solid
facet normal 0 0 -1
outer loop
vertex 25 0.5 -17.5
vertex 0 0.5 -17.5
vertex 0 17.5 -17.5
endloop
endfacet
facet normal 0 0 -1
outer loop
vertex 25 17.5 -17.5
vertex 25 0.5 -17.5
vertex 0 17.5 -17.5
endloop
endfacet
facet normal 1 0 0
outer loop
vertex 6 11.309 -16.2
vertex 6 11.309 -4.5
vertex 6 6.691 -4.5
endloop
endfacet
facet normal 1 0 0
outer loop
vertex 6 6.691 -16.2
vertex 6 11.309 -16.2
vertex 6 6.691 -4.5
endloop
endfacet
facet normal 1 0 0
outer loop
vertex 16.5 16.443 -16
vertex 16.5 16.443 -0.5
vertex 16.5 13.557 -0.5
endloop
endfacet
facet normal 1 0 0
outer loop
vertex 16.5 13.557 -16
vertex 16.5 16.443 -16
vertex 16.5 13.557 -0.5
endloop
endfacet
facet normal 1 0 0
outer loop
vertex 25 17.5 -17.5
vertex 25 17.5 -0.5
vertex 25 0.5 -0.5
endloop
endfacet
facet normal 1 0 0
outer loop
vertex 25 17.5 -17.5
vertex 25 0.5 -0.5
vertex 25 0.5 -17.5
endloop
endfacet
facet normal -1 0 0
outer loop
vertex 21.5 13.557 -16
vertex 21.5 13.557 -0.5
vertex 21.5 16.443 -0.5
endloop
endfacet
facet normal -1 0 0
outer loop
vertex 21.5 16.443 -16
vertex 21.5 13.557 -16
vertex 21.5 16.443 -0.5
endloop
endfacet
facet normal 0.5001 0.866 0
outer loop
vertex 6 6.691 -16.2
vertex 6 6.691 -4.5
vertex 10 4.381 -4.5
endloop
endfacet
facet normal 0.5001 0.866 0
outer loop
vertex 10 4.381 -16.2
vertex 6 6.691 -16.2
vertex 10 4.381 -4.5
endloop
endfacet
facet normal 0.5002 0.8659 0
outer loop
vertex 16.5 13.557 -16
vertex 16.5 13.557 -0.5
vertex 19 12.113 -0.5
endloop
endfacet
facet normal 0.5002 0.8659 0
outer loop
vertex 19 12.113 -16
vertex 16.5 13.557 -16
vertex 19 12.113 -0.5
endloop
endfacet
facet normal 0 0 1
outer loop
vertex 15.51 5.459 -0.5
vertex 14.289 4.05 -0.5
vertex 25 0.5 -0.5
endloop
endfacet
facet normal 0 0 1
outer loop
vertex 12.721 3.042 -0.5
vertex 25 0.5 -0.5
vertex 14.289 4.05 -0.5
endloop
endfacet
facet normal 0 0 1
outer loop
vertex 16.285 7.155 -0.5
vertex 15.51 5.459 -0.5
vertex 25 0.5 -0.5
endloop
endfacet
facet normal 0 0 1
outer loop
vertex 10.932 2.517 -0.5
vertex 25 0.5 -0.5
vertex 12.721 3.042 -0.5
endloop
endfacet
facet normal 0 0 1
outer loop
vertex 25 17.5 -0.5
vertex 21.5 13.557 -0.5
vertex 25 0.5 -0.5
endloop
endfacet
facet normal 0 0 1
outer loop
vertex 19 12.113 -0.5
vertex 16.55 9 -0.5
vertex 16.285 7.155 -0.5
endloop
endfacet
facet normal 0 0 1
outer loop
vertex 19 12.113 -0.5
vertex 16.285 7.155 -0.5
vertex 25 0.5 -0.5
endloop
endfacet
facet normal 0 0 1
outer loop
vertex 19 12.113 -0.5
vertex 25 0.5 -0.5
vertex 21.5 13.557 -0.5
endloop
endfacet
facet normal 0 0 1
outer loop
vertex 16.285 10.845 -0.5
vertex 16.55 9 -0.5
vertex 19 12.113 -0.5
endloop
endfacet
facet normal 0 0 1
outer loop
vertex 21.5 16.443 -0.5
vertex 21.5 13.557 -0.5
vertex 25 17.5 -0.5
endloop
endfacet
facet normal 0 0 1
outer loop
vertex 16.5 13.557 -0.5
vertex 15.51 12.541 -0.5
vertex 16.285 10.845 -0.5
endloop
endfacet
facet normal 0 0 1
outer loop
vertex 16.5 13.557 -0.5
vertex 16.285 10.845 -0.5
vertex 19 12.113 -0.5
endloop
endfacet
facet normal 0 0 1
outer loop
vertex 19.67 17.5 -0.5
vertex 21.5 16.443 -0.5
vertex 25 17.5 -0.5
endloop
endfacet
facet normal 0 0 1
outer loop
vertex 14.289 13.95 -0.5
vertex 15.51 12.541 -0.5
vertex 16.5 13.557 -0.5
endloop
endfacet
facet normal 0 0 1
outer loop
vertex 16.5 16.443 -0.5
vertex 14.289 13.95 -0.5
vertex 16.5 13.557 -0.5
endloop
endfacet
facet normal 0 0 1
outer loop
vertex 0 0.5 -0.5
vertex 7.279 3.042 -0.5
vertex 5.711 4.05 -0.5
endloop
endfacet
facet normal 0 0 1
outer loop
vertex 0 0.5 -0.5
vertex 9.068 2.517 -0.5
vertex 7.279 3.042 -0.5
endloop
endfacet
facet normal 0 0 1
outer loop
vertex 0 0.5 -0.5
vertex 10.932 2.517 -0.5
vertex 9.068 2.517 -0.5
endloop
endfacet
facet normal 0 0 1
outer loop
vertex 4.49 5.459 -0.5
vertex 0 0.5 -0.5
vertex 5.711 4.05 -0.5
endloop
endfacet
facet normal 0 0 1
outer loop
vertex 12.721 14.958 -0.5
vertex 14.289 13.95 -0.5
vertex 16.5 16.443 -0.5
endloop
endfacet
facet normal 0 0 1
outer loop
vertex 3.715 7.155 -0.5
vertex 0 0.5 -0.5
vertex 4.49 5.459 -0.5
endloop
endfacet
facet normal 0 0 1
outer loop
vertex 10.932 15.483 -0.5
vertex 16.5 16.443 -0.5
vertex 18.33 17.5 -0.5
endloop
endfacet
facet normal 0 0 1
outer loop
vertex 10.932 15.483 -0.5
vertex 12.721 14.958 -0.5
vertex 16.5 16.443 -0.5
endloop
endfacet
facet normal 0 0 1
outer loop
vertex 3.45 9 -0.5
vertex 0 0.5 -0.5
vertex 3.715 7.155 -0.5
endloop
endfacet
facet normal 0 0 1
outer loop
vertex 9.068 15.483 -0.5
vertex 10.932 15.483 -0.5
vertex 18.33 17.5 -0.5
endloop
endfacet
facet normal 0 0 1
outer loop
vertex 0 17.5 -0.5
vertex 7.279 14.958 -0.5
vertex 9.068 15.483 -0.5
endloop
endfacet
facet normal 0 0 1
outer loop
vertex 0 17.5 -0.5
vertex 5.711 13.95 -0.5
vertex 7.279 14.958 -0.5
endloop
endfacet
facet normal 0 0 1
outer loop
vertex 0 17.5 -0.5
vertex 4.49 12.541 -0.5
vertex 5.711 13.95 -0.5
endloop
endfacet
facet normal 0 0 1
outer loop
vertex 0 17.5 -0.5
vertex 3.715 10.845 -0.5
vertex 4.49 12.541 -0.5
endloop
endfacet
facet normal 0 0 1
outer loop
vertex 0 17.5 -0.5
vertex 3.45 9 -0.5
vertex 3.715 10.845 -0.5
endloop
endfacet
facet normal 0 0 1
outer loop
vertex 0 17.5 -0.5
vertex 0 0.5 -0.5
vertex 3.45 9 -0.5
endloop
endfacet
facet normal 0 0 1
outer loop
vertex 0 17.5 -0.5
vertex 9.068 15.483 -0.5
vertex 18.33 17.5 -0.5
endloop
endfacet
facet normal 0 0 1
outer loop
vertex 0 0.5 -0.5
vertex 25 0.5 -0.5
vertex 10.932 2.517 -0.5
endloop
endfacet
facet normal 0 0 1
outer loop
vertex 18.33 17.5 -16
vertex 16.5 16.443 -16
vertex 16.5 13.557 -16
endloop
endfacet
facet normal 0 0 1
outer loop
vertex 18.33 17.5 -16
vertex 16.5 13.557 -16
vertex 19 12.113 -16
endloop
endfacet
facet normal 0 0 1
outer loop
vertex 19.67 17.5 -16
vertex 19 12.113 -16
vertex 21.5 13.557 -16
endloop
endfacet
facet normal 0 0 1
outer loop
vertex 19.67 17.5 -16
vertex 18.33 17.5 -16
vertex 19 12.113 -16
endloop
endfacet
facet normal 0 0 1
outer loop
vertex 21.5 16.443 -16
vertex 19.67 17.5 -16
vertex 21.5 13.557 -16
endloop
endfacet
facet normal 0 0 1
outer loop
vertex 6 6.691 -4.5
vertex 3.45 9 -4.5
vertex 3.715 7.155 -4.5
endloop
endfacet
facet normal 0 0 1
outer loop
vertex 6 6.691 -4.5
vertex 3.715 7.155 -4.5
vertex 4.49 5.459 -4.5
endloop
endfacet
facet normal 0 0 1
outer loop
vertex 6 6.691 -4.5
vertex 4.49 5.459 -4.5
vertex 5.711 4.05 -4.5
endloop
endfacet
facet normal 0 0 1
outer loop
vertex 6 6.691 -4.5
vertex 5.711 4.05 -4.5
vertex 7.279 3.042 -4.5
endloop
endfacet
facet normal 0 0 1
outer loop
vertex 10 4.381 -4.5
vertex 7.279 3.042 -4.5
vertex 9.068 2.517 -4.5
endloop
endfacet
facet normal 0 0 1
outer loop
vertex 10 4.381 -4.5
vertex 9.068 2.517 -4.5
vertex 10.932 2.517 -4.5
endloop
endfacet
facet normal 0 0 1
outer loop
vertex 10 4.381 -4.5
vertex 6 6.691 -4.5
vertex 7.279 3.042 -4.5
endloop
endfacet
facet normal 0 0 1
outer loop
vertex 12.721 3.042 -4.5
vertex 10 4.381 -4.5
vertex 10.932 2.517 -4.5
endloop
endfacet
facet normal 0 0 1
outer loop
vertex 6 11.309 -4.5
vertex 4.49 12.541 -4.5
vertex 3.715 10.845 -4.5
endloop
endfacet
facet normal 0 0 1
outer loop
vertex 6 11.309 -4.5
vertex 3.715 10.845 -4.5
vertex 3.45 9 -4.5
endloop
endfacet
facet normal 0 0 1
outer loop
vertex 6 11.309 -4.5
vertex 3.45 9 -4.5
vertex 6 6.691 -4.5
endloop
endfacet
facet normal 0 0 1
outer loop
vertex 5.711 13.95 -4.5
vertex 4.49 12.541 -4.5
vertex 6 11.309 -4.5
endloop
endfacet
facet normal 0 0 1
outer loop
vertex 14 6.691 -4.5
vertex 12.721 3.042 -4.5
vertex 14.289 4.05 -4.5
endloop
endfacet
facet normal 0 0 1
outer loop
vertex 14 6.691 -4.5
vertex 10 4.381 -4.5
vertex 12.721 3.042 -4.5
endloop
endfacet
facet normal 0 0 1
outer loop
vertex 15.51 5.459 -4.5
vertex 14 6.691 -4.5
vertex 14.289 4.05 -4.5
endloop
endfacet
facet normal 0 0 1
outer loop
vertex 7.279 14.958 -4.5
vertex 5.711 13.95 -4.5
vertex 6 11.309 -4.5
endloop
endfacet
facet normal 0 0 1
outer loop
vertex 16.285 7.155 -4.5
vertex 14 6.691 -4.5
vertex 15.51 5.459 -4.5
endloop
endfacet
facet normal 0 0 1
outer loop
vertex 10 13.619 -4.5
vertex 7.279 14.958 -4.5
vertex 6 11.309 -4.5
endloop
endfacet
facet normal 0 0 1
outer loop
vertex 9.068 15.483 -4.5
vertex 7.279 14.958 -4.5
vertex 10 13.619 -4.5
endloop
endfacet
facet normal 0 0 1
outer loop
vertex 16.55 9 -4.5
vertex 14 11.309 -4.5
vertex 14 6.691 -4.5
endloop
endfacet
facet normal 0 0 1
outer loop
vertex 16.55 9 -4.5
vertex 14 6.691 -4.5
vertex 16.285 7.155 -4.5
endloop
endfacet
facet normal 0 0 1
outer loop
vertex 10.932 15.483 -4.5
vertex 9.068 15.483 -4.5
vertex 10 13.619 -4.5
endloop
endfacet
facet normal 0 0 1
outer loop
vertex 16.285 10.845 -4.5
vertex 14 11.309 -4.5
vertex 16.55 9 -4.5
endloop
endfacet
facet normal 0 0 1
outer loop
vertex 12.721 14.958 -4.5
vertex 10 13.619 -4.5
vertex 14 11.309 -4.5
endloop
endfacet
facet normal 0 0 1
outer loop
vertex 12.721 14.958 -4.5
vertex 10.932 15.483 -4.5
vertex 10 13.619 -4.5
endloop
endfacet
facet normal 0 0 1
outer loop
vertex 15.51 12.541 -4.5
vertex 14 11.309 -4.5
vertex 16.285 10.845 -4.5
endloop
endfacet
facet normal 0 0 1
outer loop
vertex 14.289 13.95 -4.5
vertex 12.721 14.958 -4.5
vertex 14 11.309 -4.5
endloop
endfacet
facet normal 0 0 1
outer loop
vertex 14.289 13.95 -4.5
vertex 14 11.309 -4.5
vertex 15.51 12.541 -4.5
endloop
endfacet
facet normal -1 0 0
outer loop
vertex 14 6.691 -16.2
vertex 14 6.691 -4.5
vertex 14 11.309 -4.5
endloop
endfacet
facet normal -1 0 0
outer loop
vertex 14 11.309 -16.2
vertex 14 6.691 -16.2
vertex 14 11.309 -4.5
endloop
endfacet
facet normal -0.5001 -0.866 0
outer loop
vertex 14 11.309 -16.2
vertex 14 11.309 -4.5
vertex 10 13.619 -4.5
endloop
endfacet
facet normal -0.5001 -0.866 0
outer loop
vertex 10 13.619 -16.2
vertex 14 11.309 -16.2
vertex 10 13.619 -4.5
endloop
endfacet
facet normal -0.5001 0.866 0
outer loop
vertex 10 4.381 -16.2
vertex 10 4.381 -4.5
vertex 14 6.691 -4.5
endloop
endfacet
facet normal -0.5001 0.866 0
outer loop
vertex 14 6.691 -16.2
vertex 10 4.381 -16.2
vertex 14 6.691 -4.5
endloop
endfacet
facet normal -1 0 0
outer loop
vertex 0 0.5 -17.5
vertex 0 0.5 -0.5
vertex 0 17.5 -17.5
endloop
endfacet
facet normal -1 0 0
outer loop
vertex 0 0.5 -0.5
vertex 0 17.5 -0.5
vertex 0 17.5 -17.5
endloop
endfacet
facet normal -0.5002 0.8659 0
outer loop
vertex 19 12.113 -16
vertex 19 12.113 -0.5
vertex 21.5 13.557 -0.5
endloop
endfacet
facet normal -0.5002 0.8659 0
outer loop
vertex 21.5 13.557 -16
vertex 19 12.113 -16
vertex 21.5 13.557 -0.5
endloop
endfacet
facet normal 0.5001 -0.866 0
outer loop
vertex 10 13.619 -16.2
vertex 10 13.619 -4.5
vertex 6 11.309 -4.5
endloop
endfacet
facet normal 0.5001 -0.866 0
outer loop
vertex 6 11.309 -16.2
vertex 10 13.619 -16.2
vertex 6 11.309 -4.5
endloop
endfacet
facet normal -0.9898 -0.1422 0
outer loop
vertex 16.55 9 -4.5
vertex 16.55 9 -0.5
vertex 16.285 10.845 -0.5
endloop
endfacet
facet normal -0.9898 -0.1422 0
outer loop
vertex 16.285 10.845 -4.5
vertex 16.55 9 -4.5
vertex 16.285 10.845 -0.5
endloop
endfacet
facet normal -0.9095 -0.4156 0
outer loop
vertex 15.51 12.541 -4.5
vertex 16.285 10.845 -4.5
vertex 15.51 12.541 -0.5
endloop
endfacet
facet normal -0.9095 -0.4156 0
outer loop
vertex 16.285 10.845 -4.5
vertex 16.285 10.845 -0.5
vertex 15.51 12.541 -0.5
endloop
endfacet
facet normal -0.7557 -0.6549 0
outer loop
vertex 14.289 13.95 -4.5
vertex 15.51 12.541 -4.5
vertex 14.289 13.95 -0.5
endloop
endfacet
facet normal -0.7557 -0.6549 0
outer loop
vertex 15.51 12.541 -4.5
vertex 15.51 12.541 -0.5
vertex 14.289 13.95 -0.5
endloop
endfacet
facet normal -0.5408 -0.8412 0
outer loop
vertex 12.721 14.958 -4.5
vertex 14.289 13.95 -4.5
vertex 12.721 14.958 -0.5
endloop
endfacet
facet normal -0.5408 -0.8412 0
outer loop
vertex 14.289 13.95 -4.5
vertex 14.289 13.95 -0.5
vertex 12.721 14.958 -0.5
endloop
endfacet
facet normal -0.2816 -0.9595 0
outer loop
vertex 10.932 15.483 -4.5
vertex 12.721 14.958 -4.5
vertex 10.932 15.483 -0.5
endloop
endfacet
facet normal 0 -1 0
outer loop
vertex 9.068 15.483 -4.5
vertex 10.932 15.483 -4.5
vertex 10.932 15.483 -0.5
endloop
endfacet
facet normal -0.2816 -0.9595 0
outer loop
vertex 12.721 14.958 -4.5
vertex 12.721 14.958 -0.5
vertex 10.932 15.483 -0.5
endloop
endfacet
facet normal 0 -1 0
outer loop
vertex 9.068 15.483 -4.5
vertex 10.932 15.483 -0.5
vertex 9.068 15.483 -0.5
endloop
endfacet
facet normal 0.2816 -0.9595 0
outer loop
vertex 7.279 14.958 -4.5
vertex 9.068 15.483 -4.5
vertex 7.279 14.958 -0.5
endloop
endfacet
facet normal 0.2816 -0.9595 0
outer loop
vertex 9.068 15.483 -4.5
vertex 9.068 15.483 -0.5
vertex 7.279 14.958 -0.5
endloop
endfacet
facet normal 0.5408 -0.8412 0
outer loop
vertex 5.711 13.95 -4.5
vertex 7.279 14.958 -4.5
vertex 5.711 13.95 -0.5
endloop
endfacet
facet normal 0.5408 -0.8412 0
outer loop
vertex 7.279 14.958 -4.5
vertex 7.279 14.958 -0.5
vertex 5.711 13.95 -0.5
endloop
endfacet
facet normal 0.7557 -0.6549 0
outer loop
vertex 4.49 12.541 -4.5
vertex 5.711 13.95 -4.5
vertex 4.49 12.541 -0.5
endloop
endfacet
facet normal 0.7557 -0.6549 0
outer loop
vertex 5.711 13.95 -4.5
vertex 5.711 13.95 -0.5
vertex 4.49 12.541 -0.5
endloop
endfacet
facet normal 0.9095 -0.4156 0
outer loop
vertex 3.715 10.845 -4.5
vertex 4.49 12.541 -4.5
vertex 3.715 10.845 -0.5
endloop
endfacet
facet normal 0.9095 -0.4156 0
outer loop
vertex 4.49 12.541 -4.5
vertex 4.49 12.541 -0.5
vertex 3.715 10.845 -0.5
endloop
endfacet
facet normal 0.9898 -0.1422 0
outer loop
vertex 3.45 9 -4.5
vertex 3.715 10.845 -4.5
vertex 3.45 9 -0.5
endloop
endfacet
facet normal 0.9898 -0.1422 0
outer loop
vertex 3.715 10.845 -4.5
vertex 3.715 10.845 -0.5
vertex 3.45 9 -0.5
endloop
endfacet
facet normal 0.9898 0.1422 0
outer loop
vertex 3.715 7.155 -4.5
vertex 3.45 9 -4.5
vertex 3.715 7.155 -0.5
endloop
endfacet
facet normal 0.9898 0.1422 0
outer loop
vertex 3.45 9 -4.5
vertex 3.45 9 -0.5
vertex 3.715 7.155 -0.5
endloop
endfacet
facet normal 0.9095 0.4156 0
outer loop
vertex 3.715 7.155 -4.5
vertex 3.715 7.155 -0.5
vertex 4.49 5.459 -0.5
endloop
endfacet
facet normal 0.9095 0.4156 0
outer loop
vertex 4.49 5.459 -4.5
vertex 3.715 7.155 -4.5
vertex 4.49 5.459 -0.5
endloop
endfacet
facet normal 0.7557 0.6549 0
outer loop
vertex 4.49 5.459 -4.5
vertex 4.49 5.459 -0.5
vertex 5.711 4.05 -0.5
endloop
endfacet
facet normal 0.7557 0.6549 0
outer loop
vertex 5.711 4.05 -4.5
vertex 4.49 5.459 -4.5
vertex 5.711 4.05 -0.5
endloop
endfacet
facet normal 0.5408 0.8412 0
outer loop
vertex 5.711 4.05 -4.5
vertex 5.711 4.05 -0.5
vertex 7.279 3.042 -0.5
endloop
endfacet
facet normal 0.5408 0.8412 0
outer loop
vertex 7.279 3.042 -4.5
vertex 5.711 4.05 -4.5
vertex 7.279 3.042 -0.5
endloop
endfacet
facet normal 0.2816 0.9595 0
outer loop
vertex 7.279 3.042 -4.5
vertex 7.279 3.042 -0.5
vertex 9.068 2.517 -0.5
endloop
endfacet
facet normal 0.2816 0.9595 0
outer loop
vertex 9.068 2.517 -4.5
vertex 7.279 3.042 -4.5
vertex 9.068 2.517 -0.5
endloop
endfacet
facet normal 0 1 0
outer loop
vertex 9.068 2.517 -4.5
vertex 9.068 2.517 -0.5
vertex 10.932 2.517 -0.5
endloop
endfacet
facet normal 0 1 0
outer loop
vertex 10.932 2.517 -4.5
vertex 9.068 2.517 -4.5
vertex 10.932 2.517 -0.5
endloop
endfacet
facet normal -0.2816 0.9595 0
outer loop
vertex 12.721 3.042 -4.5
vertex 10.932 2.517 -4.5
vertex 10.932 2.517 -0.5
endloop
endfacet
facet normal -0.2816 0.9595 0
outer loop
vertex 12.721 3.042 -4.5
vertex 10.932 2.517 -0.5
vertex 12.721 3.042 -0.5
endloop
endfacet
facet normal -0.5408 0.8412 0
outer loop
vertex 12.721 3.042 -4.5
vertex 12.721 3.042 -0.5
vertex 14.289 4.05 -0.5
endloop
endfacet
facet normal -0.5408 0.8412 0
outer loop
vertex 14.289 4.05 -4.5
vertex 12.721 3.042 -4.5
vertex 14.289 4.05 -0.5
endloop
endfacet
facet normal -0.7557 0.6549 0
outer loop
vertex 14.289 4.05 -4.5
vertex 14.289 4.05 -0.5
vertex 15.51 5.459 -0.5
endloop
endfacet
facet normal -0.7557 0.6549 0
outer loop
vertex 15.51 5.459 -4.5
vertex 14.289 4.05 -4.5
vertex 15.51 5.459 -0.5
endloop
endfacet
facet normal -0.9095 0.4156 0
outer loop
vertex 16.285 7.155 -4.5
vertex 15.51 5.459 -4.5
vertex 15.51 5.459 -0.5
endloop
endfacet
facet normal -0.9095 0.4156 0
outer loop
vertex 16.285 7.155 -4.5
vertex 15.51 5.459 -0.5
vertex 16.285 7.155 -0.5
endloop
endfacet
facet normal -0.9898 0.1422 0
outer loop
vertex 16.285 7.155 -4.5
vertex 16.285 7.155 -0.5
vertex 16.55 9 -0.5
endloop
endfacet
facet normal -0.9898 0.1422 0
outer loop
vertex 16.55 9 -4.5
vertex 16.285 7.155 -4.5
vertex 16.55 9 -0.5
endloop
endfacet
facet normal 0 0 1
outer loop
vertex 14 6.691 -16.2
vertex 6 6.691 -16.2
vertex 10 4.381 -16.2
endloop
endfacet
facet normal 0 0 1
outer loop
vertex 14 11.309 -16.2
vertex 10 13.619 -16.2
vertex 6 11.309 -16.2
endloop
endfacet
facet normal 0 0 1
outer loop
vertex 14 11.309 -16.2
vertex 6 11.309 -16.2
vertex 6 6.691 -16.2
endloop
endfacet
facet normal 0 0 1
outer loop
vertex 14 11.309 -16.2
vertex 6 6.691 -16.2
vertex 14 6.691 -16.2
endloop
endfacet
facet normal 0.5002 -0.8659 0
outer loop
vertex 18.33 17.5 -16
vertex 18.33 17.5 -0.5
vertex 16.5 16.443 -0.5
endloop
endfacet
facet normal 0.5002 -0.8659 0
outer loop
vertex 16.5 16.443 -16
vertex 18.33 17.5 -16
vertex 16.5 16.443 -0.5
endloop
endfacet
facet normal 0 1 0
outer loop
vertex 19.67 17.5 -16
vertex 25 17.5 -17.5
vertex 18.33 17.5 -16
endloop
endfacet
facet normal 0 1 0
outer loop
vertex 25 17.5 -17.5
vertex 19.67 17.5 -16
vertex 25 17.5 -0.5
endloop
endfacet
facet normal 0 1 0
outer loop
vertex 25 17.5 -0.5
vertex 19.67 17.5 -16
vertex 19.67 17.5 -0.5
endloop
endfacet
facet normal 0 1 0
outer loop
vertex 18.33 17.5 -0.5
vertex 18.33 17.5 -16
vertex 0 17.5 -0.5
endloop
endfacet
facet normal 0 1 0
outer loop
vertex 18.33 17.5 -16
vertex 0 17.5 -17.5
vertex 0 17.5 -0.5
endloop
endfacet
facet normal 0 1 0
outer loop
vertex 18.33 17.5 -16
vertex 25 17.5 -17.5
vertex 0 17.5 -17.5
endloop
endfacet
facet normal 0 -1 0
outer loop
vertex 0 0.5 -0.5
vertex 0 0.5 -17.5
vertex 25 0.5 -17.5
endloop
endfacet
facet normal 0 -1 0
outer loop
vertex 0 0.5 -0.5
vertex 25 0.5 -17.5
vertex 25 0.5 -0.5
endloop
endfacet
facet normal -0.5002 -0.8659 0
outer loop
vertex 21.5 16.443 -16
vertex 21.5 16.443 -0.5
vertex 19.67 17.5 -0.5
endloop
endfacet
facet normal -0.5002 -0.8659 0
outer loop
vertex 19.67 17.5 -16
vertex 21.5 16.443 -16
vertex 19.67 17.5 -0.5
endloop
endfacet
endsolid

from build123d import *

# Parameters (mm, degrees)
SKETCH_1_W          = 18
SKETCH_1_H          = 18
EXTRUDE_1_DEPTH     = 25
SKETCH_2_R          = 6.55
CUT_EXTRUDE_1_DEPTH = 4.5
CUT_EXTRUDE_2_DEPTH = 11.7
CUT_EXTRUDE_3_DEPTH = 16
SKETCH_6_W          = 18
SKETCH_6_H          = 18
SKETCH_6_W_2        = 17
SKETCH_6_H_2        = 17
CUT_EXTRUDE_5_DEPTH = 26


with BuildPart() as part:
    # 草图1 → 凸台-拉伸1 (new body)
    with BuildSketch(Plane(origin=(0, 0, 0), x_dir=(0, 0, -1), z_dir=(1, 0, 0))):
        with Locations((9, 9)):
            Rectangle(SKETCH_1_W, SKETCH_1_H)
    extrude(amount=EXTRUDE_1_DEPTH)

    # 草图2 → 切除-拉伸1 (cut)
    with BuildSketch(Plane.XY):
        with Locations((10, 9)):
            Circle(SKETCH_2_R)
    extrude(amount=-CUT_EXTRUDE_1_DEPTH, mode=Mode.SUBTRACT)

    # 草图3 → 切除-拉伸2 (cut)
    with BuildSketch(Plane.XY.offset(-4.5)):
        Polygon((10, 13.618802154), (6, 11.309401077), (6, 6.690598923), (10, 4.381197846), (14, 6.690598923), (14, 11.309401077), align=None)
    extrude(amount=-CUT_EXTRUDE_2_DEPTH, mode=Mode.SUBTRACT)

    # 草图4 → 切除-拉伸3 (cut)
    with BuildSketch(Plane.XY):
        Polygon((19, 17.886751346), (16.5, 16.443375673), (16.5, 13.556624327), (19, 12.113248654), (21.5, 13.556624327), (21.5, 16.443375673), align=None)
    extrude(amount=-CUT_EXTRUDE_3_DEPTH, mode=Mode.SUBTRACT)

    # 草图6 → 切除-拉伸5 (cut, through all)
    with BuildSketch(Plane.ZY):
        with Locations((-9, 9)):
            Rectangle(SKETCH_6_W, SKETCH_6_H)
        with Locations((-9, 9)):
            Rectangle(SKETCH_6_W_2, SKETCH_6_H_2, mode=Mode.SUBTRACT)
    extrude(amount=-CUT_EXTRUDE_5_DEPTH, mode=Mode.SUBTRACT)


solid = part.part
